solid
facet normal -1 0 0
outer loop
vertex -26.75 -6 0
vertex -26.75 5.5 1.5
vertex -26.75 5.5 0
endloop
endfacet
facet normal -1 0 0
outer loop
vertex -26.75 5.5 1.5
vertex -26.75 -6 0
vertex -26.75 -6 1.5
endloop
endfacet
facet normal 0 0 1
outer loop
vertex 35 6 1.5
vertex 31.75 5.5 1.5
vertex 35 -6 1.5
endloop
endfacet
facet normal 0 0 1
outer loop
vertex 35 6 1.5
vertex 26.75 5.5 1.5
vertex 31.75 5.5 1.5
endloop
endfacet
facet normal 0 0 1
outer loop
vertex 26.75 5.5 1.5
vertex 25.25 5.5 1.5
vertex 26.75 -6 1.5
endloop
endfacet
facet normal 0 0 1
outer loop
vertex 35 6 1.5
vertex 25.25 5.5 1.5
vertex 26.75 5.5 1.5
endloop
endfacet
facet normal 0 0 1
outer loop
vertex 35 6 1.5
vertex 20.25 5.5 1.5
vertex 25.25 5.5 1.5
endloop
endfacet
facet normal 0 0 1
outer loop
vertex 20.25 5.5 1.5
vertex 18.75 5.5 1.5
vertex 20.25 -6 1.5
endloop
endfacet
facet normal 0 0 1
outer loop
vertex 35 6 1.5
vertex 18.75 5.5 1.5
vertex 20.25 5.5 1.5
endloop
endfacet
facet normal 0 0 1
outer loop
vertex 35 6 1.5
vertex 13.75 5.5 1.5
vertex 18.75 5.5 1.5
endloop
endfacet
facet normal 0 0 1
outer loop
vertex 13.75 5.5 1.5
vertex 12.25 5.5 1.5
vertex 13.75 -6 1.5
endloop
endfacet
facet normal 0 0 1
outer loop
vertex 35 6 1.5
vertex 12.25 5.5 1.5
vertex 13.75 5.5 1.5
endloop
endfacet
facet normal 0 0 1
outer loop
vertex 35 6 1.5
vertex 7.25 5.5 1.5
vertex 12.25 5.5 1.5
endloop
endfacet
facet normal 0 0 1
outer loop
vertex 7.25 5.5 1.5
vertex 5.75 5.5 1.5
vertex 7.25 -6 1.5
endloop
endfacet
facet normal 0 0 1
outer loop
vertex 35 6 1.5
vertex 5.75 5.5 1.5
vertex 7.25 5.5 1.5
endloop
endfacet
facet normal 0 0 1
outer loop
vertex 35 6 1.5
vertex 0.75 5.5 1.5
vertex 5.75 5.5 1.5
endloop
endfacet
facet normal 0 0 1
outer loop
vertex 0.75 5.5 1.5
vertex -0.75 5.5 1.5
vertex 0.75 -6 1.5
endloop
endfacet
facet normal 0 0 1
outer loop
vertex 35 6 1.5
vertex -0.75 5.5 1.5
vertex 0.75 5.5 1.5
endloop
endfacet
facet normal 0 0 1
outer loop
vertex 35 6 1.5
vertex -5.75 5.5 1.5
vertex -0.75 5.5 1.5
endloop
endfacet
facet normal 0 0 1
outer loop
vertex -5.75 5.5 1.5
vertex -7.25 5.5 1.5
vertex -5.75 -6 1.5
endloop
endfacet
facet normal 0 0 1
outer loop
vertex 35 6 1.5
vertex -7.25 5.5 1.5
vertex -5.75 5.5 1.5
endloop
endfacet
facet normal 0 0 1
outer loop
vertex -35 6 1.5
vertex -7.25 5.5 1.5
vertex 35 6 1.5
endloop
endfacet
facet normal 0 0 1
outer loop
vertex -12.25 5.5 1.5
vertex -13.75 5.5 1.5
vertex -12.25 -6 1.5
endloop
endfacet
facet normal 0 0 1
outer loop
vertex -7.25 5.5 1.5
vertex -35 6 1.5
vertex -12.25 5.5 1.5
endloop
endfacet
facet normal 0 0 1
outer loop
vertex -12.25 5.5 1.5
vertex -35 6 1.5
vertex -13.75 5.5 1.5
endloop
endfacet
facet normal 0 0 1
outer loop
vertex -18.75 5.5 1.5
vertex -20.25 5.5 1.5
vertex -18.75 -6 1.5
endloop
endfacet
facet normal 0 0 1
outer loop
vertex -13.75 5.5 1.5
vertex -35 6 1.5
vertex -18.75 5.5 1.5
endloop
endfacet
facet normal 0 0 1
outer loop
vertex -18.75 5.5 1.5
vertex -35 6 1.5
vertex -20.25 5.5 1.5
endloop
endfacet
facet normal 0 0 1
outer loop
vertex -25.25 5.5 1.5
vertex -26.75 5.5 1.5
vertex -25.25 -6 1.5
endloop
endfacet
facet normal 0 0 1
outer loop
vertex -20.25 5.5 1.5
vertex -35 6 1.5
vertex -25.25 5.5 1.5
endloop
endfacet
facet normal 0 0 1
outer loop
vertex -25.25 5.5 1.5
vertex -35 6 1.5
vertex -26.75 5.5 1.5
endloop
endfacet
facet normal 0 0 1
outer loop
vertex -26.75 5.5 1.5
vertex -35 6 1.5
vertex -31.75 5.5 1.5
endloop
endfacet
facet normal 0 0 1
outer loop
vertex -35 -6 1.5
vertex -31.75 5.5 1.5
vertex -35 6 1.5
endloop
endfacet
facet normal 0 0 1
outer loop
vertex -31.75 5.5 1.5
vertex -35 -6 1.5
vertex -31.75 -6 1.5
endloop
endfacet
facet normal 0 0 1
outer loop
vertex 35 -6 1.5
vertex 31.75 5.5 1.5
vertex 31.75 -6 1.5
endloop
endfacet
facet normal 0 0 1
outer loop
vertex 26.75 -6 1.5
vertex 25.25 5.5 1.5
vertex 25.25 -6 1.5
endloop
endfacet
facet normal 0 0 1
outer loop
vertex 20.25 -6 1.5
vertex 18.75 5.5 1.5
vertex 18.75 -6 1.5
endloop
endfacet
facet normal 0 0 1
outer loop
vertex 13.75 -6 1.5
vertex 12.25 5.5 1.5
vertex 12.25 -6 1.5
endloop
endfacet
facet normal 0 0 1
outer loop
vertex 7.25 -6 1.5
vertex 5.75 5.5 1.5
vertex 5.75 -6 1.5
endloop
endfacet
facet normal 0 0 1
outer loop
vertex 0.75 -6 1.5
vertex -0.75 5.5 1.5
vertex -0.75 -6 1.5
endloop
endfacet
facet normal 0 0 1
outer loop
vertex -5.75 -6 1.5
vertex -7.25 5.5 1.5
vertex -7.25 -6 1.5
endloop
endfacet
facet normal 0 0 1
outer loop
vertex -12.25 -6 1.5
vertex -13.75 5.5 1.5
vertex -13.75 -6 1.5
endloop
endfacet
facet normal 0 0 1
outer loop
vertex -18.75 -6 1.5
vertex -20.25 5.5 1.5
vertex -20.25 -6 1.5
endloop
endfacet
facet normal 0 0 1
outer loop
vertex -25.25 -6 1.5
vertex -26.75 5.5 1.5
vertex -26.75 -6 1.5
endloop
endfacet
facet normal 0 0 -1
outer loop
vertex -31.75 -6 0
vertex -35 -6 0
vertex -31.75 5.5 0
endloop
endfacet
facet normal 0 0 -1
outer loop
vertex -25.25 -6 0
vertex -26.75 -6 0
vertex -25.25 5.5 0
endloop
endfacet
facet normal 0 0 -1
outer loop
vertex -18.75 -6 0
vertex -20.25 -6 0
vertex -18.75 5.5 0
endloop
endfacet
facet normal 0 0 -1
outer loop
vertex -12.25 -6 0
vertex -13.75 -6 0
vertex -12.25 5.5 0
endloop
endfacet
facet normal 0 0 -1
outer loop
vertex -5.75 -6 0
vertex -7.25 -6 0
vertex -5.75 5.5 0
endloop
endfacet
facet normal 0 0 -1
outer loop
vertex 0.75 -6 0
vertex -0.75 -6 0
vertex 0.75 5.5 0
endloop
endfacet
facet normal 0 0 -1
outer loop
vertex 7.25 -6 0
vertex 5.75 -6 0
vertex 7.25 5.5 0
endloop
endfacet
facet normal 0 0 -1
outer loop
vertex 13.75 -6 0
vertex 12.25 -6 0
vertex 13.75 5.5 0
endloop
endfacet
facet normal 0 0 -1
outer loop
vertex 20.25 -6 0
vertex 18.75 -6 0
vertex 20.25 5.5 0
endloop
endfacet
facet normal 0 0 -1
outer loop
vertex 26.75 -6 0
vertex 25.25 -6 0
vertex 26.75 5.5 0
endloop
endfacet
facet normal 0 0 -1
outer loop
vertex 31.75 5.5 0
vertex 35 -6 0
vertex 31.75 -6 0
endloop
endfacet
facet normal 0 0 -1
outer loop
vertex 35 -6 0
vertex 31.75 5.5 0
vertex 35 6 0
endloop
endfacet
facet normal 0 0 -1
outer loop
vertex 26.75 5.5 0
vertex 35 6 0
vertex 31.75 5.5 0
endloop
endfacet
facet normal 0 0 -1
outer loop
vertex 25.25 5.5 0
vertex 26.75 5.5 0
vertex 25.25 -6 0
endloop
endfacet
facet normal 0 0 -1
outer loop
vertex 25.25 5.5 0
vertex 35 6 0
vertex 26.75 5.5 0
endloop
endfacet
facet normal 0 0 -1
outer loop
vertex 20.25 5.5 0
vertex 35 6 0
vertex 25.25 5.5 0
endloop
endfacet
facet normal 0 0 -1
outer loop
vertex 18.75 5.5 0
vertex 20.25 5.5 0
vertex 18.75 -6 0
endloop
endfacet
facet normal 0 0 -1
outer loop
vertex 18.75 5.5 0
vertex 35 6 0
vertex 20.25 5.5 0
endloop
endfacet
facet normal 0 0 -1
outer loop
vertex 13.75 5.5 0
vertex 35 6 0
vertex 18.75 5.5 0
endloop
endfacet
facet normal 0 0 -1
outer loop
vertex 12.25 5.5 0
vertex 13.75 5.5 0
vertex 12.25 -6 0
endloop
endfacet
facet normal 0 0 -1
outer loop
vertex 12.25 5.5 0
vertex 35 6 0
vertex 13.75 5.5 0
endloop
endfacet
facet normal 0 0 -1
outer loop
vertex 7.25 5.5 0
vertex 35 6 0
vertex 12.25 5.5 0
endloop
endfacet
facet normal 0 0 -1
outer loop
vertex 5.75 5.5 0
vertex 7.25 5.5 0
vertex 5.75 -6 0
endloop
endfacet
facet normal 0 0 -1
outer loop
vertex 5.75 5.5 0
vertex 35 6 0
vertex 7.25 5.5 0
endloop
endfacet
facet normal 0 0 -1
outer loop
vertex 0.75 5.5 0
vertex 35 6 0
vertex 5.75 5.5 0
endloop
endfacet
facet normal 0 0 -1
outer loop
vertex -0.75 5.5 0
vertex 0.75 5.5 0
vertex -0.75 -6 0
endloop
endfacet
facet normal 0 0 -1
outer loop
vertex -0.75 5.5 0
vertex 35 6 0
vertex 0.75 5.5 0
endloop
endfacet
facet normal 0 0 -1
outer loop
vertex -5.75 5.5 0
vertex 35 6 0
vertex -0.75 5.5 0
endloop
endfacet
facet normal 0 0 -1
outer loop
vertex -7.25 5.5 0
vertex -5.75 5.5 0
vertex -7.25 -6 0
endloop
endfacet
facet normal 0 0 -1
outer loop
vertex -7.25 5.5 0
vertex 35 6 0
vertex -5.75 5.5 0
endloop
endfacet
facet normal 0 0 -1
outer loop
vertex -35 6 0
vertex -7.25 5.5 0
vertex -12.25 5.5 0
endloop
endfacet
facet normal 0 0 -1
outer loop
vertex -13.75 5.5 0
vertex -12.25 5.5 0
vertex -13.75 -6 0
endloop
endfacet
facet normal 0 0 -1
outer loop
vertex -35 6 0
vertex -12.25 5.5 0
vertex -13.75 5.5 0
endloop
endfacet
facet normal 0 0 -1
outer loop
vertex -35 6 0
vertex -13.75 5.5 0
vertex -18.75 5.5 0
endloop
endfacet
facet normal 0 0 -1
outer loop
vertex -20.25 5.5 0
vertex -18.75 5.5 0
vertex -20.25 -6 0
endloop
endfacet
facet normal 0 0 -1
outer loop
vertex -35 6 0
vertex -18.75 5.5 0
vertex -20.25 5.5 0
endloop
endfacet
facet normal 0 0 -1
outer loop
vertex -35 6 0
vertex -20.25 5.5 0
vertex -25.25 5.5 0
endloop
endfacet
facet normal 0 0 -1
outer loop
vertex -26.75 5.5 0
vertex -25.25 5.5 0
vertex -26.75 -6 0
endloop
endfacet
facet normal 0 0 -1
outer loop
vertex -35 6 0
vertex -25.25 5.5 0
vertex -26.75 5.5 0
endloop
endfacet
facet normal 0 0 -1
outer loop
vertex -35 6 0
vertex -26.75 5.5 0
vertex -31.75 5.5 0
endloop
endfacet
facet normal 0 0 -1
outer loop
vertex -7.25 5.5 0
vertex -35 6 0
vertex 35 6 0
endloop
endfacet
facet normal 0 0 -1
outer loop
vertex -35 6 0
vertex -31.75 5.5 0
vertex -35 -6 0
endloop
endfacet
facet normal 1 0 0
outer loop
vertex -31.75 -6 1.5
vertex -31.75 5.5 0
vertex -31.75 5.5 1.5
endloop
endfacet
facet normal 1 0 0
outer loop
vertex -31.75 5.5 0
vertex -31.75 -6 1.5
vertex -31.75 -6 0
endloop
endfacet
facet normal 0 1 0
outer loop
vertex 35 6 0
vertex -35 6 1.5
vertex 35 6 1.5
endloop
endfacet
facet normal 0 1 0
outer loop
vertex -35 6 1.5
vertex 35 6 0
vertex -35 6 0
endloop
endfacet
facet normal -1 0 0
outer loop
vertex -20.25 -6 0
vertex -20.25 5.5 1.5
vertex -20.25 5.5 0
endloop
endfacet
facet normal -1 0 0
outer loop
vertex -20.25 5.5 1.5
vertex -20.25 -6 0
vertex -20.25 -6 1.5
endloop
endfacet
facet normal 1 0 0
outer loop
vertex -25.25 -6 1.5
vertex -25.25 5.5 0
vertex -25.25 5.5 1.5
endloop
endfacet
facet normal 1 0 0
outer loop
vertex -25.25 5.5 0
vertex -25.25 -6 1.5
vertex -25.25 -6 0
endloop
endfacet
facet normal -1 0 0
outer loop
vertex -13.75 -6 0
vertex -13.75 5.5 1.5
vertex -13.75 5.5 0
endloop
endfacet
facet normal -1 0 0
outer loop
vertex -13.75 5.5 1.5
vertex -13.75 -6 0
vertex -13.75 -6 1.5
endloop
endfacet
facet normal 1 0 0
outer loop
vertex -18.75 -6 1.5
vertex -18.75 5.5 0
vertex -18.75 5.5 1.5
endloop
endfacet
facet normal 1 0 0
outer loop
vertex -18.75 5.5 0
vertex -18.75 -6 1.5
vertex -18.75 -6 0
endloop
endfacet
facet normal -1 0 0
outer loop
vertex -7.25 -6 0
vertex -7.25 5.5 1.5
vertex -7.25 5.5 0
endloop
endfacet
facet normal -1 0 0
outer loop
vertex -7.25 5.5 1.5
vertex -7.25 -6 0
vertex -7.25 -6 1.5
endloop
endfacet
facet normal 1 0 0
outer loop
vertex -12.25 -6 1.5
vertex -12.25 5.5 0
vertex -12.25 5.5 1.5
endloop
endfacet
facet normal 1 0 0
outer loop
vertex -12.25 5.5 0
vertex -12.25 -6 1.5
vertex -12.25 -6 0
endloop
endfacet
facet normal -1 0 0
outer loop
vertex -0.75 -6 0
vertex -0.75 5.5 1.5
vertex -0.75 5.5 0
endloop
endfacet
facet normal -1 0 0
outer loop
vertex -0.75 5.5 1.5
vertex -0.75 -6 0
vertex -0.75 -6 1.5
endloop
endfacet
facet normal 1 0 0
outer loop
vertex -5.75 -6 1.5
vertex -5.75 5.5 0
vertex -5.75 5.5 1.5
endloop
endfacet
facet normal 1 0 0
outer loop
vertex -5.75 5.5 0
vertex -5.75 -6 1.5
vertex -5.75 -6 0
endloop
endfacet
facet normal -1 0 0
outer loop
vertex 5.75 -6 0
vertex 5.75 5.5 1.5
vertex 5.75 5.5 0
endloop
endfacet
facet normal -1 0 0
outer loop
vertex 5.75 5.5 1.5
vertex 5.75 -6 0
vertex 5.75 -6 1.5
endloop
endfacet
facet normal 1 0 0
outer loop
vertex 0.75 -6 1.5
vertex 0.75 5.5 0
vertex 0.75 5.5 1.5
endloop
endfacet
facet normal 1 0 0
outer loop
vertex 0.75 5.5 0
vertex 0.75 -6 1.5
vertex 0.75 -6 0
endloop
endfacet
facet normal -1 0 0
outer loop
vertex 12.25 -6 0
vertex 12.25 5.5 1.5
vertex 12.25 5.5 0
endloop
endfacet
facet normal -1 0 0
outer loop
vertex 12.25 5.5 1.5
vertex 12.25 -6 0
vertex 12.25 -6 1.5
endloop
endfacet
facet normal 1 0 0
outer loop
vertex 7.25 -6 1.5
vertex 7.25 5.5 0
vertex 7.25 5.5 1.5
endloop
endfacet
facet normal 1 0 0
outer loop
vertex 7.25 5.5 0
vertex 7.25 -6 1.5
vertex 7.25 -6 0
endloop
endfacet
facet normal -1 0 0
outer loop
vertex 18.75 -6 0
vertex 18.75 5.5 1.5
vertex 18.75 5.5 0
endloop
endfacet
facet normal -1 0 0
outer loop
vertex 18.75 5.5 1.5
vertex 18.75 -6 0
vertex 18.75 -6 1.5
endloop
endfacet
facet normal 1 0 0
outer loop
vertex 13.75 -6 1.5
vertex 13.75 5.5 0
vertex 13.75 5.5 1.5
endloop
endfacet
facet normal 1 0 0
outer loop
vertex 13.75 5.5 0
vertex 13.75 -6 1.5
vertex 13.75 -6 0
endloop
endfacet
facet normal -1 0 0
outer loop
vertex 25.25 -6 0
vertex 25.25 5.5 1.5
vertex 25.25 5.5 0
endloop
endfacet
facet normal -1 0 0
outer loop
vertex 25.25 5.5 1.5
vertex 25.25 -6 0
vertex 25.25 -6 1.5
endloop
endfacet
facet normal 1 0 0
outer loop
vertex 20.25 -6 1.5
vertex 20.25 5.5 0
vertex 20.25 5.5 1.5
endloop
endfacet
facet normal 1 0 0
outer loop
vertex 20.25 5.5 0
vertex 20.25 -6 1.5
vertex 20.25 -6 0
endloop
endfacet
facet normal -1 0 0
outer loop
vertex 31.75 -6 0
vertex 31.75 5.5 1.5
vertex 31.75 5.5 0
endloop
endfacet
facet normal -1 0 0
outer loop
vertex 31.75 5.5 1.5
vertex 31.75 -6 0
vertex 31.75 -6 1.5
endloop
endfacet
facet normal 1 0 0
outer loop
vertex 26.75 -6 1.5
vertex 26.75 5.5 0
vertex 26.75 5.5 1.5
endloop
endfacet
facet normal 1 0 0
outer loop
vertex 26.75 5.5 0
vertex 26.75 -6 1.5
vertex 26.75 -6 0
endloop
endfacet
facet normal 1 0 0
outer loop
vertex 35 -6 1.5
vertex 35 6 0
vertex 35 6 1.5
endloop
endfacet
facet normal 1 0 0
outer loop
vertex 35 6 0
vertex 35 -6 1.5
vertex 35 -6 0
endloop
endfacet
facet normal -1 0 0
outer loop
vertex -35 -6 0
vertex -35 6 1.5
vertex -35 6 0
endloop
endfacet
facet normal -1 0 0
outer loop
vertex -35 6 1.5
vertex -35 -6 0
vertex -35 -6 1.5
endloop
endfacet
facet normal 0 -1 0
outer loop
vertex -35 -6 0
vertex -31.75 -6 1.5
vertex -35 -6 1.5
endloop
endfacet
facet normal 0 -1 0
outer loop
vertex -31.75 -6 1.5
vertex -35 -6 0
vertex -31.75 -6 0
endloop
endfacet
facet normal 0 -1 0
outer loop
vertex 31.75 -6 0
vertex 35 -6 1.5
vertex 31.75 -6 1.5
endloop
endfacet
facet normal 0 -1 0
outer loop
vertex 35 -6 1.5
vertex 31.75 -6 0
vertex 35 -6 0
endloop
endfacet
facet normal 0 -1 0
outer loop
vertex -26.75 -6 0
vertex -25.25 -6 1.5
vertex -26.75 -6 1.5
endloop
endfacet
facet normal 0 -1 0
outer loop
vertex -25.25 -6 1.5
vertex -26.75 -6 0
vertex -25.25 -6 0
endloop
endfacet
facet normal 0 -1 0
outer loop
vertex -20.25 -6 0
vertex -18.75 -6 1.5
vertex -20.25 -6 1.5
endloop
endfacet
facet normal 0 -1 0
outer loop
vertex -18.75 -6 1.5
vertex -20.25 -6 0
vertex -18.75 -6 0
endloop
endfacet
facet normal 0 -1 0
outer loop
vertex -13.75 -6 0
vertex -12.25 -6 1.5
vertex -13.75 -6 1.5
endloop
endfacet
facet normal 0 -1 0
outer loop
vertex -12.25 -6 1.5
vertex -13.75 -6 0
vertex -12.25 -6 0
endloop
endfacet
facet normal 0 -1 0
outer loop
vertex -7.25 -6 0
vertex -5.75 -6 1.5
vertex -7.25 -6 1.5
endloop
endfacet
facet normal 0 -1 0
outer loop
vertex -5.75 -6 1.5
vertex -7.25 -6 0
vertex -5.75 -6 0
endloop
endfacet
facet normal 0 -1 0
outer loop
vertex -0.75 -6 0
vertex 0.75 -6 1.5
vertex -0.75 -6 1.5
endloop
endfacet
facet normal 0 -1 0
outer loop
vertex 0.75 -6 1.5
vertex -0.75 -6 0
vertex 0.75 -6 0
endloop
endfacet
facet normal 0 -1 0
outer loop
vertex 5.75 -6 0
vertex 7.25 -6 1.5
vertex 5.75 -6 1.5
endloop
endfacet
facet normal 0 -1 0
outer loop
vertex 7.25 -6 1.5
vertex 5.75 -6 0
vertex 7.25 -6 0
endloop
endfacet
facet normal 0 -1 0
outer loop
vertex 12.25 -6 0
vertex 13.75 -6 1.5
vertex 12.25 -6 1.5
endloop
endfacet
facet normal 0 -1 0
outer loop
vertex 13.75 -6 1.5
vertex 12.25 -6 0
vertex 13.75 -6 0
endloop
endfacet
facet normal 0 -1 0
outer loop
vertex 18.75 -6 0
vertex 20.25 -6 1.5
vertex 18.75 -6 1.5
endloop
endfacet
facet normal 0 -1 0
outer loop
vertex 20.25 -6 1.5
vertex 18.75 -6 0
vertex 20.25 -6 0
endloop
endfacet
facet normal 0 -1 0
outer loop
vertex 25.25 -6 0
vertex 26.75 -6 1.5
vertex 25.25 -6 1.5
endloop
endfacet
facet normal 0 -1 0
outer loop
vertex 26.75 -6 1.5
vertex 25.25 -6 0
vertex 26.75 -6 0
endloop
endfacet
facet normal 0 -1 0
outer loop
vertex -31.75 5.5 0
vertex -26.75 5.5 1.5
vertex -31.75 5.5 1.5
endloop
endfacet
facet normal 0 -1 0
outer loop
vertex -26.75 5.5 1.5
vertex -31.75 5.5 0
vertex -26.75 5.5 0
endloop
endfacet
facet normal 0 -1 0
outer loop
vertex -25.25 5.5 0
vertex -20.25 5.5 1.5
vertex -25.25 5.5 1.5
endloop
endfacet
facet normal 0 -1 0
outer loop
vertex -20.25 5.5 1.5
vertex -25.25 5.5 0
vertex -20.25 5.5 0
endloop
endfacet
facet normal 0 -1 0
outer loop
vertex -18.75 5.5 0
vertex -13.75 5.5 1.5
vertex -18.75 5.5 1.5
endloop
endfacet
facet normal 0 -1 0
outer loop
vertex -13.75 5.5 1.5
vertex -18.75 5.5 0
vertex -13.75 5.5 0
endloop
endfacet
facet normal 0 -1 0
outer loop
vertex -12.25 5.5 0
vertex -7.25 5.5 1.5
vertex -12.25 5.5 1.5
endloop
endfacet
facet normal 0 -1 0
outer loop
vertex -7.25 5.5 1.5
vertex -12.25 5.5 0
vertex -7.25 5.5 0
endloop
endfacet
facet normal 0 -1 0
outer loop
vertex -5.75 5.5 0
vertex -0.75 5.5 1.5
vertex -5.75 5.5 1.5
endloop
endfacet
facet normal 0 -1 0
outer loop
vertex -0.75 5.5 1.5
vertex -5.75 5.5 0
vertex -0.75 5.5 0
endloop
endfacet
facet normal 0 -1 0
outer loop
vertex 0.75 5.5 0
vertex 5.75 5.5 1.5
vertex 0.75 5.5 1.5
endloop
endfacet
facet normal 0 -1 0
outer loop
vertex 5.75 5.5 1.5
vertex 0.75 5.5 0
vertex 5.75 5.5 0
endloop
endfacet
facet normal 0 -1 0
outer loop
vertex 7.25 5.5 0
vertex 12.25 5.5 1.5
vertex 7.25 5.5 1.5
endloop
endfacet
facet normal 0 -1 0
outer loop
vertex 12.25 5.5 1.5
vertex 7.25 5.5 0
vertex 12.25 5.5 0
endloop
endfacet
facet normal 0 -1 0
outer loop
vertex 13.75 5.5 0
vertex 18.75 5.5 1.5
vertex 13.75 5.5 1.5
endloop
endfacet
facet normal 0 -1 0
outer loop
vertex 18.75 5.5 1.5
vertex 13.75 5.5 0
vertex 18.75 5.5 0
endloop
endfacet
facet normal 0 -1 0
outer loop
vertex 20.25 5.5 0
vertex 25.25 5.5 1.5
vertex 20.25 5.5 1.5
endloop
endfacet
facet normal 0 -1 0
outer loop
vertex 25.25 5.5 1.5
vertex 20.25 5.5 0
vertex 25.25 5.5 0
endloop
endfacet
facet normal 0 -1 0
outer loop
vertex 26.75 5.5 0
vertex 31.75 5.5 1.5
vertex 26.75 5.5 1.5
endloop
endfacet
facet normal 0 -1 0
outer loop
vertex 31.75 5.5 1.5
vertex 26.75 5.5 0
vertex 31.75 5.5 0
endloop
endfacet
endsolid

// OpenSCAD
// 10-well comb for casting agarose gels, printed lying flat
// Units: mm

// ---- Spine (back bar) ----
spine_len   = 70;   // spine length along X
spine_wid   = 12;   // spine width along Y
plate_thk   = 1.5;  // plate thickness along Z

// ---- Teeth ----
tooth_count = 10;   // number of teeth
tooth_w     = 5.0;  // tooth width along X
tooth_l     = 12;   // tooth length along Y (hangs in -Y)
tooth_gap   = 1.5;  // gap between neighbouring teeth along X

// ---- Misc ----
eps         = 0.5;  // cutter overshoot past faces
$fn         = 64;

// Derived: row length of teeth + gaps, centred on spine
row_len = (tooth_count * tooth_w) + ((tooth_count - 1) * tooth_gap);

difference() {
    // Plate: spine + teeth
    union() {
        // Spine
        translate([-spine_len/2, -spine_wid/2, 0])
            cube([spine_len, spine_wid, plate_thk]);

        // Teeth, centred on spine in X
        for (i = [0 : tooth_count - 1]) {
            x = -row_len/2 + i * (tooth_w + tooth_gap);
            translate([x, -spine_wid/2 - tooth_l, 0])
                cube([tooth_w, tooth_l + spine_wid, plate_thk]);
        }
    }

    // Cutters: 10 square wells through the plate, one per tooth
    for (i = [0 : tooth_count - 1]) {
        x = -row_len/2 + i * (tooth_w + tooth_gap);
        translate([x, -spine_wid/2 - tooth_l - eps, -eps])
            cube([tooth_w, tooth_l + spine_wid, plate_thk + 2*eps]);
    }
}
